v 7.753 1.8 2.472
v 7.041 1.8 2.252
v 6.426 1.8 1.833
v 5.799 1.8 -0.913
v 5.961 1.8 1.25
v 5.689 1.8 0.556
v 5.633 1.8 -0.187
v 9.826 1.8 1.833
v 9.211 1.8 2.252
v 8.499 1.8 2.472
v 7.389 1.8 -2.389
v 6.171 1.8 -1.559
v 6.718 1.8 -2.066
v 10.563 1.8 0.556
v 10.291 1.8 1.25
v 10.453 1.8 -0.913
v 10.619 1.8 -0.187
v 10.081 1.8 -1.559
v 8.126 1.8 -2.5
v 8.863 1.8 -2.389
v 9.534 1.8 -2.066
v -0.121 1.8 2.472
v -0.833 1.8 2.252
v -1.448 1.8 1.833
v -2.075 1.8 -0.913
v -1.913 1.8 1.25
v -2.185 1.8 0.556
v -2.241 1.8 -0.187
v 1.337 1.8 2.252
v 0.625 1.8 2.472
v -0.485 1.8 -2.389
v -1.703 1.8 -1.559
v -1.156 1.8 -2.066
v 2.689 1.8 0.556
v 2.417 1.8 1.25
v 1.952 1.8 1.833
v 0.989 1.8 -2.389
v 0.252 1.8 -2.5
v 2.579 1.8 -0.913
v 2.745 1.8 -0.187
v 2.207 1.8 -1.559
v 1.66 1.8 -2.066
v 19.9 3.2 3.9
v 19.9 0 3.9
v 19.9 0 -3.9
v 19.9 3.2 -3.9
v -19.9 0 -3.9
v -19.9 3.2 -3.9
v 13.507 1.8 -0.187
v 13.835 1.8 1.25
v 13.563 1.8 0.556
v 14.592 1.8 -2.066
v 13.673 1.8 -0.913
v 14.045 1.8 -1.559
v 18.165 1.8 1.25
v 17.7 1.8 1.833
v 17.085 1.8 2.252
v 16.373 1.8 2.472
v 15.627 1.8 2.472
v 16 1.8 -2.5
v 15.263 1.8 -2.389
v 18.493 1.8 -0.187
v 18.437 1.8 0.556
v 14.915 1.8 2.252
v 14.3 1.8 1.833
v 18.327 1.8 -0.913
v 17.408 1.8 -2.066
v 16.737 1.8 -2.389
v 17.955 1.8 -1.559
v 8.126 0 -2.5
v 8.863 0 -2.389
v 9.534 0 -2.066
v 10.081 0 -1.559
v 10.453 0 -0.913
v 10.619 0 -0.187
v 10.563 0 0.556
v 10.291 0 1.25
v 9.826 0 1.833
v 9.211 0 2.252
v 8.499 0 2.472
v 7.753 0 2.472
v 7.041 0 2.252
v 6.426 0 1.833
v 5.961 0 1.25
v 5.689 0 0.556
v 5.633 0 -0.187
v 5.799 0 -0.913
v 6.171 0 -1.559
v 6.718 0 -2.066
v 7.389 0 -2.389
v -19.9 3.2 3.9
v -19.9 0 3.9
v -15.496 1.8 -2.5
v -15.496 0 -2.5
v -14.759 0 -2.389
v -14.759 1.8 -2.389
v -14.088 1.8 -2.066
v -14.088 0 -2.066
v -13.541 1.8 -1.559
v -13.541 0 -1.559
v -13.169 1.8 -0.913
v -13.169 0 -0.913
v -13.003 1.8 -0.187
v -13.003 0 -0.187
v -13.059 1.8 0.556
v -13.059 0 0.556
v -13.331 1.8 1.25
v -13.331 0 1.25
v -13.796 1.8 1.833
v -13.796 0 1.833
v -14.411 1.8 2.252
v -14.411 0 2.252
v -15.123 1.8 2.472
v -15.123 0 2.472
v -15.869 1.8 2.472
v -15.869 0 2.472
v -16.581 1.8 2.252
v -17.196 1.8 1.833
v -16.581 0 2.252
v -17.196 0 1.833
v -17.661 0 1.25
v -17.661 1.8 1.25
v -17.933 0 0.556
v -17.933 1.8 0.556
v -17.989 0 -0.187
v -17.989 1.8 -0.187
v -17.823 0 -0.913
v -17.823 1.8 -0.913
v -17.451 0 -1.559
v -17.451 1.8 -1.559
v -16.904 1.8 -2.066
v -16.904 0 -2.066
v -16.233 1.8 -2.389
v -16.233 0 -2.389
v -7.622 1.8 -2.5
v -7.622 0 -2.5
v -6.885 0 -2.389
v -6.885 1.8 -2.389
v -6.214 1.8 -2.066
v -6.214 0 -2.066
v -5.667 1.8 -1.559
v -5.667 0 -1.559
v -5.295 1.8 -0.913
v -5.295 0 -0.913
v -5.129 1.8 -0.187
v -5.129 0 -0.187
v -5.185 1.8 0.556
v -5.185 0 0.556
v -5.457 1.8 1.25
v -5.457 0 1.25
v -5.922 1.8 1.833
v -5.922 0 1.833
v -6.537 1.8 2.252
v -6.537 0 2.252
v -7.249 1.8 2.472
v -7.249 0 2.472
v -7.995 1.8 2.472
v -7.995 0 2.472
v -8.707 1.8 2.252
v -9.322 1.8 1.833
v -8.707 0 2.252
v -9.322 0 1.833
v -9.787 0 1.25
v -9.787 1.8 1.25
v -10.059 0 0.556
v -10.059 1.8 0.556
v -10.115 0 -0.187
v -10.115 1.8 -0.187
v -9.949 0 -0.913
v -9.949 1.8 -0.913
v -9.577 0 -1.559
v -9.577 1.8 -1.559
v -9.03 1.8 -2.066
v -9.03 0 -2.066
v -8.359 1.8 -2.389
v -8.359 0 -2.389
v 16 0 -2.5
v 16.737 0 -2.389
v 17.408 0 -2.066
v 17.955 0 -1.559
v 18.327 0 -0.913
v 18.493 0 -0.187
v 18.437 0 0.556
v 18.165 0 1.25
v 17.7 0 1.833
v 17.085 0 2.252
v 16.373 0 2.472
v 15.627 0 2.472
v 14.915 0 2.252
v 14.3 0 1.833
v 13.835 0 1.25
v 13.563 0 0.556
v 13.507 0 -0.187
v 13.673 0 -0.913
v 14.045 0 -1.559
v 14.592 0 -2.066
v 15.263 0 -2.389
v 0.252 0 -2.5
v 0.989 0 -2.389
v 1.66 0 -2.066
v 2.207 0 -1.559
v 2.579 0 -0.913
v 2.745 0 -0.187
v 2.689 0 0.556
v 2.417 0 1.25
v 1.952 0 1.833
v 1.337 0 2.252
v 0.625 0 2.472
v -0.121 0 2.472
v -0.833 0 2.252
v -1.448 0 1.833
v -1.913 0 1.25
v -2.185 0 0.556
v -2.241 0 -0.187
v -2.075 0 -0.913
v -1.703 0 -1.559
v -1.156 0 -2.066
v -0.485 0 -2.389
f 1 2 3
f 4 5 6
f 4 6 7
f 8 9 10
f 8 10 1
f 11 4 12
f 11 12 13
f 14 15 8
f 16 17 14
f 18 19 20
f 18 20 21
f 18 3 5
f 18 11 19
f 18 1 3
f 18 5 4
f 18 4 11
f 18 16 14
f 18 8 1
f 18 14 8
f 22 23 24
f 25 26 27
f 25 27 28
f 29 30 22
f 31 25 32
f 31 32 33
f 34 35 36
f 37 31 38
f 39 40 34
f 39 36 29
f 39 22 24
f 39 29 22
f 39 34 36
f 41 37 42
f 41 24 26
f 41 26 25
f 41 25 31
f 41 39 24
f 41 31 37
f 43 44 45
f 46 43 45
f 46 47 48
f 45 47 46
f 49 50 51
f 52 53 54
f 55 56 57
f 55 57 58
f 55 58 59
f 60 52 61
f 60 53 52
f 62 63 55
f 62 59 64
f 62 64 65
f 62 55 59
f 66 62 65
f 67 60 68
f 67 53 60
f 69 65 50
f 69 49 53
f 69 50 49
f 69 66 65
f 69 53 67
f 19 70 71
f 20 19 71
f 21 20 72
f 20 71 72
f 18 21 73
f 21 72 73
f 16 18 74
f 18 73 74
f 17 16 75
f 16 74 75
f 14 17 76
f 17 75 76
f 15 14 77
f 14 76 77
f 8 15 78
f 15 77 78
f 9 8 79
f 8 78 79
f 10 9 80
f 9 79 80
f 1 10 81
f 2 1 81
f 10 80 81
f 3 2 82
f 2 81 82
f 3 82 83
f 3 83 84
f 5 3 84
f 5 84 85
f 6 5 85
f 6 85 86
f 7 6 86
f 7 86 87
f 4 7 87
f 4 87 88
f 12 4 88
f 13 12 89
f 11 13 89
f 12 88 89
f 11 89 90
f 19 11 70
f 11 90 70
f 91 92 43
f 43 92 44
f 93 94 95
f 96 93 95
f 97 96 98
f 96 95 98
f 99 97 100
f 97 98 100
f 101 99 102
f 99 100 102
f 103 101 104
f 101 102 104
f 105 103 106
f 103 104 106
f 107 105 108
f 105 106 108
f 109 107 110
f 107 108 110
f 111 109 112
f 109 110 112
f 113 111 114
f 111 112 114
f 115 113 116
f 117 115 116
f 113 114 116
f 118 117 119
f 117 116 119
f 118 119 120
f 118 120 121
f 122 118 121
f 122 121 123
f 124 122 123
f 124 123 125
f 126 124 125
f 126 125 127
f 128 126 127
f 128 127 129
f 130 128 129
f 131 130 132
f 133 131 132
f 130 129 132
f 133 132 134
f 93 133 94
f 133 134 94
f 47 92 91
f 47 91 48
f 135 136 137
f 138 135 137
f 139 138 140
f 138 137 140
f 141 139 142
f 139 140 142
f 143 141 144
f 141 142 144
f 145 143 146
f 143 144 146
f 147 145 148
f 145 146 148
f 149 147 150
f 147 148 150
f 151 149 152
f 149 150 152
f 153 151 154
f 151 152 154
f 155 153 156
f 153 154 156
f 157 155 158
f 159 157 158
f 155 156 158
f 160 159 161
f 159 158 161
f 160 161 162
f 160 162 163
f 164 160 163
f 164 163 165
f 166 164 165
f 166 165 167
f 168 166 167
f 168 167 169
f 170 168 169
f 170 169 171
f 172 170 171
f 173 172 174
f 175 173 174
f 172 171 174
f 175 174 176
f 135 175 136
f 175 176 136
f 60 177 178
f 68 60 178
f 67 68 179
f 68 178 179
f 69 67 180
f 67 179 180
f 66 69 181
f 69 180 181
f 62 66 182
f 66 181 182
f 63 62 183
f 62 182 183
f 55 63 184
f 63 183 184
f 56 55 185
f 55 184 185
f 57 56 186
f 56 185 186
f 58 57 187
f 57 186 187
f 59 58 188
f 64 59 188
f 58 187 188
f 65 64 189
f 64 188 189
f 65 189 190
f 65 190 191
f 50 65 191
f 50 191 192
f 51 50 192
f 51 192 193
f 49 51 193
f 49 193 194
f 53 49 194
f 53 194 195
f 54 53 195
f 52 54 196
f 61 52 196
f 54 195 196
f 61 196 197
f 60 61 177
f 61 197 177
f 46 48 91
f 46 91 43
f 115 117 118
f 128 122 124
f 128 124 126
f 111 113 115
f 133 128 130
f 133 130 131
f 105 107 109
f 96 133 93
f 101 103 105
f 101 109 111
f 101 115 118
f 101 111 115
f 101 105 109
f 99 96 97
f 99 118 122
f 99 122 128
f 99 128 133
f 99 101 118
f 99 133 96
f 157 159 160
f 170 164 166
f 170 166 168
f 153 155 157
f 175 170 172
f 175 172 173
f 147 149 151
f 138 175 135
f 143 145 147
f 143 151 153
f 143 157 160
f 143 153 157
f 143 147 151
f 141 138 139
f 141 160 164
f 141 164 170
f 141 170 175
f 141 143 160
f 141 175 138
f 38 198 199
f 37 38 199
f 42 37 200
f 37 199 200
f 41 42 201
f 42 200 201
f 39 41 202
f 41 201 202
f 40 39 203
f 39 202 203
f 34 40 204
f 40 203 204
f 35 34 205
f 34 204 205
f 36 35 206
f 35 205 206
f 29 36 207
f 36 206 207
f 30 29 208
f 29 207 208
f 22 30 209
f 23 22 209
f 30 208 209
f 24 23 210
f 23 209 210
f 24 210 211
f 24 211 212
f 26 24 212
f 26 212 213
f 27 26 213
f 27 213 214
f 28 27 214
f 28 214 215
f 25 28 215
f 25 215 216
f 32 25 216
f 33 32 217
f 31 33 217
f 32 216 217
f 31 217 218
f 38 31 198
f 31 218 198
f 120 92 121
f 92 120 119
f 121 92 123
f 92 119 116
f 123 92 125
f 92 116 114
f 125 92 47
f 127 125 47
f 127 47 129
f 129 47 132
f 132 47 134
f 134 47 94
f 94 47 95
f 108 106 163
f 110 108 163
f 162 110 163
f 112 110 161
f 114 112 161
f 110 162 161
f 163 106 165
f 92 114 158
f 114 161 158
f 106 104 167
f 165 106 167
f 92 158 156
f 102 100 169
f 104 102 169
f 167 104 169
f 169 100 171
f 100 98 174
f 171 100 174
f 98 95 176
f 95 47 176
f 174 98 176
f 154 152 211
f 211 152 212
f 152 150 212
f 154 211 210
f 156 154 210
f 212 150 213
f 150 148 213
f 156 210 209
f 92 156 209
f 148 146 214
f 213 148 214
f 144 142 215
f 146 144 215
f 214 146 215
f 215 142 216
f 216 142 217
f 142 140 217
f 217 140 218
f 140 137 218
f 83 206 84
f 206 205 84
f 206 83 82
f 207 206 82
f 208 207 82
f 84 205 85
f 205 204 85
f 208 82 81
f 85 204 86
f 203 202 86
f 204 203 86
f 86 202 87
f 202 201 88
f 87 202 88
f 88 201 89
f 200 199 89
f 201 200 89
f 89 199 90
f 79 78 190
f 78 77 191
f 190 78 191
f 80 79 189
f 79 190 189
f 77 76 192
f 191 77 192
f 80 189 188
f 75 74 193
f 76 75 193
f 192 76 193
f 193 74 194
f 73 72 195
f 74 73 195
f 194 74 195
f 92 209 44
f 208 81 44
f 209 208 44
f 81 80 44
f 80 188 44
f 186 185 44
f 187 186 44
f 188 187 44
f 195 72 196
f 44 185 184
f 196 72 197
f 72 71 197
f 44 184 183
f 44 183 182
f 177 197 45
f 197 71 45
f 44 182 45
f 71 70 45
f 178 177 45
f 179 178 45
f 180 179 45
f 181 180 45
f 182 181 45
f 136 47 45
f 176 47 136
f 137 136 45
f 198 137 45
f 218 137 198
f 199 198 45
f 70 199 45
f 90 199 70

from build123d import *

# Parameters (mm, degrees)
SKETCH_1_W          = 39.8
SKETCH_1_H          = 7.8
EXTRUDE_1_DEPTH     = 3.2
SKETCH_2_R          = 2.5
CUT_EXTRUDE_1_DEPTH = 1.8


with BuildPart() as part:
    # Эскиз1 → Бобышка-Вытянуть1 (new body)
    with BuildSketch(Plane(origin=(0, 0, 0), x_dir=(1, 0, 0), z_dir=(0, 1, 0))):
        Rectangle(SKETCH_1_W, SKETCH_1_H)
    extrude(amount=EXTRUDE_1_DEPTH)

    # Эскиз2 → Вырез-Вытянуть1 (cut)
    with BuildSketch(Plane.XZ):
        with Locations(Location((16, 0, 0), (0, 0, 270))):
            Circle(SKETCH_2_R)
        with Locations(Location((8.126, 0, 0), (0, 0, 270))):
            Circle(SKETCH_2_R)
        with Locations(Location((0.252, 0, 0), (0, 0, 270))):
            Circle(SKETCH_2_R)
        with Locations(Location((-7.622, 0, 0), (0, 0, 270))):
            Circle(SKETCH_2_R)
        with Locations(Location((-15.496, 0, 0), (0, 0, 270))):
            Circle(SKETCH_2_R)
    extrude(amount=-CUT_EXTRUDE_1_DEPTH, mode=Mode.SUBTRACT)


solid = part.part
